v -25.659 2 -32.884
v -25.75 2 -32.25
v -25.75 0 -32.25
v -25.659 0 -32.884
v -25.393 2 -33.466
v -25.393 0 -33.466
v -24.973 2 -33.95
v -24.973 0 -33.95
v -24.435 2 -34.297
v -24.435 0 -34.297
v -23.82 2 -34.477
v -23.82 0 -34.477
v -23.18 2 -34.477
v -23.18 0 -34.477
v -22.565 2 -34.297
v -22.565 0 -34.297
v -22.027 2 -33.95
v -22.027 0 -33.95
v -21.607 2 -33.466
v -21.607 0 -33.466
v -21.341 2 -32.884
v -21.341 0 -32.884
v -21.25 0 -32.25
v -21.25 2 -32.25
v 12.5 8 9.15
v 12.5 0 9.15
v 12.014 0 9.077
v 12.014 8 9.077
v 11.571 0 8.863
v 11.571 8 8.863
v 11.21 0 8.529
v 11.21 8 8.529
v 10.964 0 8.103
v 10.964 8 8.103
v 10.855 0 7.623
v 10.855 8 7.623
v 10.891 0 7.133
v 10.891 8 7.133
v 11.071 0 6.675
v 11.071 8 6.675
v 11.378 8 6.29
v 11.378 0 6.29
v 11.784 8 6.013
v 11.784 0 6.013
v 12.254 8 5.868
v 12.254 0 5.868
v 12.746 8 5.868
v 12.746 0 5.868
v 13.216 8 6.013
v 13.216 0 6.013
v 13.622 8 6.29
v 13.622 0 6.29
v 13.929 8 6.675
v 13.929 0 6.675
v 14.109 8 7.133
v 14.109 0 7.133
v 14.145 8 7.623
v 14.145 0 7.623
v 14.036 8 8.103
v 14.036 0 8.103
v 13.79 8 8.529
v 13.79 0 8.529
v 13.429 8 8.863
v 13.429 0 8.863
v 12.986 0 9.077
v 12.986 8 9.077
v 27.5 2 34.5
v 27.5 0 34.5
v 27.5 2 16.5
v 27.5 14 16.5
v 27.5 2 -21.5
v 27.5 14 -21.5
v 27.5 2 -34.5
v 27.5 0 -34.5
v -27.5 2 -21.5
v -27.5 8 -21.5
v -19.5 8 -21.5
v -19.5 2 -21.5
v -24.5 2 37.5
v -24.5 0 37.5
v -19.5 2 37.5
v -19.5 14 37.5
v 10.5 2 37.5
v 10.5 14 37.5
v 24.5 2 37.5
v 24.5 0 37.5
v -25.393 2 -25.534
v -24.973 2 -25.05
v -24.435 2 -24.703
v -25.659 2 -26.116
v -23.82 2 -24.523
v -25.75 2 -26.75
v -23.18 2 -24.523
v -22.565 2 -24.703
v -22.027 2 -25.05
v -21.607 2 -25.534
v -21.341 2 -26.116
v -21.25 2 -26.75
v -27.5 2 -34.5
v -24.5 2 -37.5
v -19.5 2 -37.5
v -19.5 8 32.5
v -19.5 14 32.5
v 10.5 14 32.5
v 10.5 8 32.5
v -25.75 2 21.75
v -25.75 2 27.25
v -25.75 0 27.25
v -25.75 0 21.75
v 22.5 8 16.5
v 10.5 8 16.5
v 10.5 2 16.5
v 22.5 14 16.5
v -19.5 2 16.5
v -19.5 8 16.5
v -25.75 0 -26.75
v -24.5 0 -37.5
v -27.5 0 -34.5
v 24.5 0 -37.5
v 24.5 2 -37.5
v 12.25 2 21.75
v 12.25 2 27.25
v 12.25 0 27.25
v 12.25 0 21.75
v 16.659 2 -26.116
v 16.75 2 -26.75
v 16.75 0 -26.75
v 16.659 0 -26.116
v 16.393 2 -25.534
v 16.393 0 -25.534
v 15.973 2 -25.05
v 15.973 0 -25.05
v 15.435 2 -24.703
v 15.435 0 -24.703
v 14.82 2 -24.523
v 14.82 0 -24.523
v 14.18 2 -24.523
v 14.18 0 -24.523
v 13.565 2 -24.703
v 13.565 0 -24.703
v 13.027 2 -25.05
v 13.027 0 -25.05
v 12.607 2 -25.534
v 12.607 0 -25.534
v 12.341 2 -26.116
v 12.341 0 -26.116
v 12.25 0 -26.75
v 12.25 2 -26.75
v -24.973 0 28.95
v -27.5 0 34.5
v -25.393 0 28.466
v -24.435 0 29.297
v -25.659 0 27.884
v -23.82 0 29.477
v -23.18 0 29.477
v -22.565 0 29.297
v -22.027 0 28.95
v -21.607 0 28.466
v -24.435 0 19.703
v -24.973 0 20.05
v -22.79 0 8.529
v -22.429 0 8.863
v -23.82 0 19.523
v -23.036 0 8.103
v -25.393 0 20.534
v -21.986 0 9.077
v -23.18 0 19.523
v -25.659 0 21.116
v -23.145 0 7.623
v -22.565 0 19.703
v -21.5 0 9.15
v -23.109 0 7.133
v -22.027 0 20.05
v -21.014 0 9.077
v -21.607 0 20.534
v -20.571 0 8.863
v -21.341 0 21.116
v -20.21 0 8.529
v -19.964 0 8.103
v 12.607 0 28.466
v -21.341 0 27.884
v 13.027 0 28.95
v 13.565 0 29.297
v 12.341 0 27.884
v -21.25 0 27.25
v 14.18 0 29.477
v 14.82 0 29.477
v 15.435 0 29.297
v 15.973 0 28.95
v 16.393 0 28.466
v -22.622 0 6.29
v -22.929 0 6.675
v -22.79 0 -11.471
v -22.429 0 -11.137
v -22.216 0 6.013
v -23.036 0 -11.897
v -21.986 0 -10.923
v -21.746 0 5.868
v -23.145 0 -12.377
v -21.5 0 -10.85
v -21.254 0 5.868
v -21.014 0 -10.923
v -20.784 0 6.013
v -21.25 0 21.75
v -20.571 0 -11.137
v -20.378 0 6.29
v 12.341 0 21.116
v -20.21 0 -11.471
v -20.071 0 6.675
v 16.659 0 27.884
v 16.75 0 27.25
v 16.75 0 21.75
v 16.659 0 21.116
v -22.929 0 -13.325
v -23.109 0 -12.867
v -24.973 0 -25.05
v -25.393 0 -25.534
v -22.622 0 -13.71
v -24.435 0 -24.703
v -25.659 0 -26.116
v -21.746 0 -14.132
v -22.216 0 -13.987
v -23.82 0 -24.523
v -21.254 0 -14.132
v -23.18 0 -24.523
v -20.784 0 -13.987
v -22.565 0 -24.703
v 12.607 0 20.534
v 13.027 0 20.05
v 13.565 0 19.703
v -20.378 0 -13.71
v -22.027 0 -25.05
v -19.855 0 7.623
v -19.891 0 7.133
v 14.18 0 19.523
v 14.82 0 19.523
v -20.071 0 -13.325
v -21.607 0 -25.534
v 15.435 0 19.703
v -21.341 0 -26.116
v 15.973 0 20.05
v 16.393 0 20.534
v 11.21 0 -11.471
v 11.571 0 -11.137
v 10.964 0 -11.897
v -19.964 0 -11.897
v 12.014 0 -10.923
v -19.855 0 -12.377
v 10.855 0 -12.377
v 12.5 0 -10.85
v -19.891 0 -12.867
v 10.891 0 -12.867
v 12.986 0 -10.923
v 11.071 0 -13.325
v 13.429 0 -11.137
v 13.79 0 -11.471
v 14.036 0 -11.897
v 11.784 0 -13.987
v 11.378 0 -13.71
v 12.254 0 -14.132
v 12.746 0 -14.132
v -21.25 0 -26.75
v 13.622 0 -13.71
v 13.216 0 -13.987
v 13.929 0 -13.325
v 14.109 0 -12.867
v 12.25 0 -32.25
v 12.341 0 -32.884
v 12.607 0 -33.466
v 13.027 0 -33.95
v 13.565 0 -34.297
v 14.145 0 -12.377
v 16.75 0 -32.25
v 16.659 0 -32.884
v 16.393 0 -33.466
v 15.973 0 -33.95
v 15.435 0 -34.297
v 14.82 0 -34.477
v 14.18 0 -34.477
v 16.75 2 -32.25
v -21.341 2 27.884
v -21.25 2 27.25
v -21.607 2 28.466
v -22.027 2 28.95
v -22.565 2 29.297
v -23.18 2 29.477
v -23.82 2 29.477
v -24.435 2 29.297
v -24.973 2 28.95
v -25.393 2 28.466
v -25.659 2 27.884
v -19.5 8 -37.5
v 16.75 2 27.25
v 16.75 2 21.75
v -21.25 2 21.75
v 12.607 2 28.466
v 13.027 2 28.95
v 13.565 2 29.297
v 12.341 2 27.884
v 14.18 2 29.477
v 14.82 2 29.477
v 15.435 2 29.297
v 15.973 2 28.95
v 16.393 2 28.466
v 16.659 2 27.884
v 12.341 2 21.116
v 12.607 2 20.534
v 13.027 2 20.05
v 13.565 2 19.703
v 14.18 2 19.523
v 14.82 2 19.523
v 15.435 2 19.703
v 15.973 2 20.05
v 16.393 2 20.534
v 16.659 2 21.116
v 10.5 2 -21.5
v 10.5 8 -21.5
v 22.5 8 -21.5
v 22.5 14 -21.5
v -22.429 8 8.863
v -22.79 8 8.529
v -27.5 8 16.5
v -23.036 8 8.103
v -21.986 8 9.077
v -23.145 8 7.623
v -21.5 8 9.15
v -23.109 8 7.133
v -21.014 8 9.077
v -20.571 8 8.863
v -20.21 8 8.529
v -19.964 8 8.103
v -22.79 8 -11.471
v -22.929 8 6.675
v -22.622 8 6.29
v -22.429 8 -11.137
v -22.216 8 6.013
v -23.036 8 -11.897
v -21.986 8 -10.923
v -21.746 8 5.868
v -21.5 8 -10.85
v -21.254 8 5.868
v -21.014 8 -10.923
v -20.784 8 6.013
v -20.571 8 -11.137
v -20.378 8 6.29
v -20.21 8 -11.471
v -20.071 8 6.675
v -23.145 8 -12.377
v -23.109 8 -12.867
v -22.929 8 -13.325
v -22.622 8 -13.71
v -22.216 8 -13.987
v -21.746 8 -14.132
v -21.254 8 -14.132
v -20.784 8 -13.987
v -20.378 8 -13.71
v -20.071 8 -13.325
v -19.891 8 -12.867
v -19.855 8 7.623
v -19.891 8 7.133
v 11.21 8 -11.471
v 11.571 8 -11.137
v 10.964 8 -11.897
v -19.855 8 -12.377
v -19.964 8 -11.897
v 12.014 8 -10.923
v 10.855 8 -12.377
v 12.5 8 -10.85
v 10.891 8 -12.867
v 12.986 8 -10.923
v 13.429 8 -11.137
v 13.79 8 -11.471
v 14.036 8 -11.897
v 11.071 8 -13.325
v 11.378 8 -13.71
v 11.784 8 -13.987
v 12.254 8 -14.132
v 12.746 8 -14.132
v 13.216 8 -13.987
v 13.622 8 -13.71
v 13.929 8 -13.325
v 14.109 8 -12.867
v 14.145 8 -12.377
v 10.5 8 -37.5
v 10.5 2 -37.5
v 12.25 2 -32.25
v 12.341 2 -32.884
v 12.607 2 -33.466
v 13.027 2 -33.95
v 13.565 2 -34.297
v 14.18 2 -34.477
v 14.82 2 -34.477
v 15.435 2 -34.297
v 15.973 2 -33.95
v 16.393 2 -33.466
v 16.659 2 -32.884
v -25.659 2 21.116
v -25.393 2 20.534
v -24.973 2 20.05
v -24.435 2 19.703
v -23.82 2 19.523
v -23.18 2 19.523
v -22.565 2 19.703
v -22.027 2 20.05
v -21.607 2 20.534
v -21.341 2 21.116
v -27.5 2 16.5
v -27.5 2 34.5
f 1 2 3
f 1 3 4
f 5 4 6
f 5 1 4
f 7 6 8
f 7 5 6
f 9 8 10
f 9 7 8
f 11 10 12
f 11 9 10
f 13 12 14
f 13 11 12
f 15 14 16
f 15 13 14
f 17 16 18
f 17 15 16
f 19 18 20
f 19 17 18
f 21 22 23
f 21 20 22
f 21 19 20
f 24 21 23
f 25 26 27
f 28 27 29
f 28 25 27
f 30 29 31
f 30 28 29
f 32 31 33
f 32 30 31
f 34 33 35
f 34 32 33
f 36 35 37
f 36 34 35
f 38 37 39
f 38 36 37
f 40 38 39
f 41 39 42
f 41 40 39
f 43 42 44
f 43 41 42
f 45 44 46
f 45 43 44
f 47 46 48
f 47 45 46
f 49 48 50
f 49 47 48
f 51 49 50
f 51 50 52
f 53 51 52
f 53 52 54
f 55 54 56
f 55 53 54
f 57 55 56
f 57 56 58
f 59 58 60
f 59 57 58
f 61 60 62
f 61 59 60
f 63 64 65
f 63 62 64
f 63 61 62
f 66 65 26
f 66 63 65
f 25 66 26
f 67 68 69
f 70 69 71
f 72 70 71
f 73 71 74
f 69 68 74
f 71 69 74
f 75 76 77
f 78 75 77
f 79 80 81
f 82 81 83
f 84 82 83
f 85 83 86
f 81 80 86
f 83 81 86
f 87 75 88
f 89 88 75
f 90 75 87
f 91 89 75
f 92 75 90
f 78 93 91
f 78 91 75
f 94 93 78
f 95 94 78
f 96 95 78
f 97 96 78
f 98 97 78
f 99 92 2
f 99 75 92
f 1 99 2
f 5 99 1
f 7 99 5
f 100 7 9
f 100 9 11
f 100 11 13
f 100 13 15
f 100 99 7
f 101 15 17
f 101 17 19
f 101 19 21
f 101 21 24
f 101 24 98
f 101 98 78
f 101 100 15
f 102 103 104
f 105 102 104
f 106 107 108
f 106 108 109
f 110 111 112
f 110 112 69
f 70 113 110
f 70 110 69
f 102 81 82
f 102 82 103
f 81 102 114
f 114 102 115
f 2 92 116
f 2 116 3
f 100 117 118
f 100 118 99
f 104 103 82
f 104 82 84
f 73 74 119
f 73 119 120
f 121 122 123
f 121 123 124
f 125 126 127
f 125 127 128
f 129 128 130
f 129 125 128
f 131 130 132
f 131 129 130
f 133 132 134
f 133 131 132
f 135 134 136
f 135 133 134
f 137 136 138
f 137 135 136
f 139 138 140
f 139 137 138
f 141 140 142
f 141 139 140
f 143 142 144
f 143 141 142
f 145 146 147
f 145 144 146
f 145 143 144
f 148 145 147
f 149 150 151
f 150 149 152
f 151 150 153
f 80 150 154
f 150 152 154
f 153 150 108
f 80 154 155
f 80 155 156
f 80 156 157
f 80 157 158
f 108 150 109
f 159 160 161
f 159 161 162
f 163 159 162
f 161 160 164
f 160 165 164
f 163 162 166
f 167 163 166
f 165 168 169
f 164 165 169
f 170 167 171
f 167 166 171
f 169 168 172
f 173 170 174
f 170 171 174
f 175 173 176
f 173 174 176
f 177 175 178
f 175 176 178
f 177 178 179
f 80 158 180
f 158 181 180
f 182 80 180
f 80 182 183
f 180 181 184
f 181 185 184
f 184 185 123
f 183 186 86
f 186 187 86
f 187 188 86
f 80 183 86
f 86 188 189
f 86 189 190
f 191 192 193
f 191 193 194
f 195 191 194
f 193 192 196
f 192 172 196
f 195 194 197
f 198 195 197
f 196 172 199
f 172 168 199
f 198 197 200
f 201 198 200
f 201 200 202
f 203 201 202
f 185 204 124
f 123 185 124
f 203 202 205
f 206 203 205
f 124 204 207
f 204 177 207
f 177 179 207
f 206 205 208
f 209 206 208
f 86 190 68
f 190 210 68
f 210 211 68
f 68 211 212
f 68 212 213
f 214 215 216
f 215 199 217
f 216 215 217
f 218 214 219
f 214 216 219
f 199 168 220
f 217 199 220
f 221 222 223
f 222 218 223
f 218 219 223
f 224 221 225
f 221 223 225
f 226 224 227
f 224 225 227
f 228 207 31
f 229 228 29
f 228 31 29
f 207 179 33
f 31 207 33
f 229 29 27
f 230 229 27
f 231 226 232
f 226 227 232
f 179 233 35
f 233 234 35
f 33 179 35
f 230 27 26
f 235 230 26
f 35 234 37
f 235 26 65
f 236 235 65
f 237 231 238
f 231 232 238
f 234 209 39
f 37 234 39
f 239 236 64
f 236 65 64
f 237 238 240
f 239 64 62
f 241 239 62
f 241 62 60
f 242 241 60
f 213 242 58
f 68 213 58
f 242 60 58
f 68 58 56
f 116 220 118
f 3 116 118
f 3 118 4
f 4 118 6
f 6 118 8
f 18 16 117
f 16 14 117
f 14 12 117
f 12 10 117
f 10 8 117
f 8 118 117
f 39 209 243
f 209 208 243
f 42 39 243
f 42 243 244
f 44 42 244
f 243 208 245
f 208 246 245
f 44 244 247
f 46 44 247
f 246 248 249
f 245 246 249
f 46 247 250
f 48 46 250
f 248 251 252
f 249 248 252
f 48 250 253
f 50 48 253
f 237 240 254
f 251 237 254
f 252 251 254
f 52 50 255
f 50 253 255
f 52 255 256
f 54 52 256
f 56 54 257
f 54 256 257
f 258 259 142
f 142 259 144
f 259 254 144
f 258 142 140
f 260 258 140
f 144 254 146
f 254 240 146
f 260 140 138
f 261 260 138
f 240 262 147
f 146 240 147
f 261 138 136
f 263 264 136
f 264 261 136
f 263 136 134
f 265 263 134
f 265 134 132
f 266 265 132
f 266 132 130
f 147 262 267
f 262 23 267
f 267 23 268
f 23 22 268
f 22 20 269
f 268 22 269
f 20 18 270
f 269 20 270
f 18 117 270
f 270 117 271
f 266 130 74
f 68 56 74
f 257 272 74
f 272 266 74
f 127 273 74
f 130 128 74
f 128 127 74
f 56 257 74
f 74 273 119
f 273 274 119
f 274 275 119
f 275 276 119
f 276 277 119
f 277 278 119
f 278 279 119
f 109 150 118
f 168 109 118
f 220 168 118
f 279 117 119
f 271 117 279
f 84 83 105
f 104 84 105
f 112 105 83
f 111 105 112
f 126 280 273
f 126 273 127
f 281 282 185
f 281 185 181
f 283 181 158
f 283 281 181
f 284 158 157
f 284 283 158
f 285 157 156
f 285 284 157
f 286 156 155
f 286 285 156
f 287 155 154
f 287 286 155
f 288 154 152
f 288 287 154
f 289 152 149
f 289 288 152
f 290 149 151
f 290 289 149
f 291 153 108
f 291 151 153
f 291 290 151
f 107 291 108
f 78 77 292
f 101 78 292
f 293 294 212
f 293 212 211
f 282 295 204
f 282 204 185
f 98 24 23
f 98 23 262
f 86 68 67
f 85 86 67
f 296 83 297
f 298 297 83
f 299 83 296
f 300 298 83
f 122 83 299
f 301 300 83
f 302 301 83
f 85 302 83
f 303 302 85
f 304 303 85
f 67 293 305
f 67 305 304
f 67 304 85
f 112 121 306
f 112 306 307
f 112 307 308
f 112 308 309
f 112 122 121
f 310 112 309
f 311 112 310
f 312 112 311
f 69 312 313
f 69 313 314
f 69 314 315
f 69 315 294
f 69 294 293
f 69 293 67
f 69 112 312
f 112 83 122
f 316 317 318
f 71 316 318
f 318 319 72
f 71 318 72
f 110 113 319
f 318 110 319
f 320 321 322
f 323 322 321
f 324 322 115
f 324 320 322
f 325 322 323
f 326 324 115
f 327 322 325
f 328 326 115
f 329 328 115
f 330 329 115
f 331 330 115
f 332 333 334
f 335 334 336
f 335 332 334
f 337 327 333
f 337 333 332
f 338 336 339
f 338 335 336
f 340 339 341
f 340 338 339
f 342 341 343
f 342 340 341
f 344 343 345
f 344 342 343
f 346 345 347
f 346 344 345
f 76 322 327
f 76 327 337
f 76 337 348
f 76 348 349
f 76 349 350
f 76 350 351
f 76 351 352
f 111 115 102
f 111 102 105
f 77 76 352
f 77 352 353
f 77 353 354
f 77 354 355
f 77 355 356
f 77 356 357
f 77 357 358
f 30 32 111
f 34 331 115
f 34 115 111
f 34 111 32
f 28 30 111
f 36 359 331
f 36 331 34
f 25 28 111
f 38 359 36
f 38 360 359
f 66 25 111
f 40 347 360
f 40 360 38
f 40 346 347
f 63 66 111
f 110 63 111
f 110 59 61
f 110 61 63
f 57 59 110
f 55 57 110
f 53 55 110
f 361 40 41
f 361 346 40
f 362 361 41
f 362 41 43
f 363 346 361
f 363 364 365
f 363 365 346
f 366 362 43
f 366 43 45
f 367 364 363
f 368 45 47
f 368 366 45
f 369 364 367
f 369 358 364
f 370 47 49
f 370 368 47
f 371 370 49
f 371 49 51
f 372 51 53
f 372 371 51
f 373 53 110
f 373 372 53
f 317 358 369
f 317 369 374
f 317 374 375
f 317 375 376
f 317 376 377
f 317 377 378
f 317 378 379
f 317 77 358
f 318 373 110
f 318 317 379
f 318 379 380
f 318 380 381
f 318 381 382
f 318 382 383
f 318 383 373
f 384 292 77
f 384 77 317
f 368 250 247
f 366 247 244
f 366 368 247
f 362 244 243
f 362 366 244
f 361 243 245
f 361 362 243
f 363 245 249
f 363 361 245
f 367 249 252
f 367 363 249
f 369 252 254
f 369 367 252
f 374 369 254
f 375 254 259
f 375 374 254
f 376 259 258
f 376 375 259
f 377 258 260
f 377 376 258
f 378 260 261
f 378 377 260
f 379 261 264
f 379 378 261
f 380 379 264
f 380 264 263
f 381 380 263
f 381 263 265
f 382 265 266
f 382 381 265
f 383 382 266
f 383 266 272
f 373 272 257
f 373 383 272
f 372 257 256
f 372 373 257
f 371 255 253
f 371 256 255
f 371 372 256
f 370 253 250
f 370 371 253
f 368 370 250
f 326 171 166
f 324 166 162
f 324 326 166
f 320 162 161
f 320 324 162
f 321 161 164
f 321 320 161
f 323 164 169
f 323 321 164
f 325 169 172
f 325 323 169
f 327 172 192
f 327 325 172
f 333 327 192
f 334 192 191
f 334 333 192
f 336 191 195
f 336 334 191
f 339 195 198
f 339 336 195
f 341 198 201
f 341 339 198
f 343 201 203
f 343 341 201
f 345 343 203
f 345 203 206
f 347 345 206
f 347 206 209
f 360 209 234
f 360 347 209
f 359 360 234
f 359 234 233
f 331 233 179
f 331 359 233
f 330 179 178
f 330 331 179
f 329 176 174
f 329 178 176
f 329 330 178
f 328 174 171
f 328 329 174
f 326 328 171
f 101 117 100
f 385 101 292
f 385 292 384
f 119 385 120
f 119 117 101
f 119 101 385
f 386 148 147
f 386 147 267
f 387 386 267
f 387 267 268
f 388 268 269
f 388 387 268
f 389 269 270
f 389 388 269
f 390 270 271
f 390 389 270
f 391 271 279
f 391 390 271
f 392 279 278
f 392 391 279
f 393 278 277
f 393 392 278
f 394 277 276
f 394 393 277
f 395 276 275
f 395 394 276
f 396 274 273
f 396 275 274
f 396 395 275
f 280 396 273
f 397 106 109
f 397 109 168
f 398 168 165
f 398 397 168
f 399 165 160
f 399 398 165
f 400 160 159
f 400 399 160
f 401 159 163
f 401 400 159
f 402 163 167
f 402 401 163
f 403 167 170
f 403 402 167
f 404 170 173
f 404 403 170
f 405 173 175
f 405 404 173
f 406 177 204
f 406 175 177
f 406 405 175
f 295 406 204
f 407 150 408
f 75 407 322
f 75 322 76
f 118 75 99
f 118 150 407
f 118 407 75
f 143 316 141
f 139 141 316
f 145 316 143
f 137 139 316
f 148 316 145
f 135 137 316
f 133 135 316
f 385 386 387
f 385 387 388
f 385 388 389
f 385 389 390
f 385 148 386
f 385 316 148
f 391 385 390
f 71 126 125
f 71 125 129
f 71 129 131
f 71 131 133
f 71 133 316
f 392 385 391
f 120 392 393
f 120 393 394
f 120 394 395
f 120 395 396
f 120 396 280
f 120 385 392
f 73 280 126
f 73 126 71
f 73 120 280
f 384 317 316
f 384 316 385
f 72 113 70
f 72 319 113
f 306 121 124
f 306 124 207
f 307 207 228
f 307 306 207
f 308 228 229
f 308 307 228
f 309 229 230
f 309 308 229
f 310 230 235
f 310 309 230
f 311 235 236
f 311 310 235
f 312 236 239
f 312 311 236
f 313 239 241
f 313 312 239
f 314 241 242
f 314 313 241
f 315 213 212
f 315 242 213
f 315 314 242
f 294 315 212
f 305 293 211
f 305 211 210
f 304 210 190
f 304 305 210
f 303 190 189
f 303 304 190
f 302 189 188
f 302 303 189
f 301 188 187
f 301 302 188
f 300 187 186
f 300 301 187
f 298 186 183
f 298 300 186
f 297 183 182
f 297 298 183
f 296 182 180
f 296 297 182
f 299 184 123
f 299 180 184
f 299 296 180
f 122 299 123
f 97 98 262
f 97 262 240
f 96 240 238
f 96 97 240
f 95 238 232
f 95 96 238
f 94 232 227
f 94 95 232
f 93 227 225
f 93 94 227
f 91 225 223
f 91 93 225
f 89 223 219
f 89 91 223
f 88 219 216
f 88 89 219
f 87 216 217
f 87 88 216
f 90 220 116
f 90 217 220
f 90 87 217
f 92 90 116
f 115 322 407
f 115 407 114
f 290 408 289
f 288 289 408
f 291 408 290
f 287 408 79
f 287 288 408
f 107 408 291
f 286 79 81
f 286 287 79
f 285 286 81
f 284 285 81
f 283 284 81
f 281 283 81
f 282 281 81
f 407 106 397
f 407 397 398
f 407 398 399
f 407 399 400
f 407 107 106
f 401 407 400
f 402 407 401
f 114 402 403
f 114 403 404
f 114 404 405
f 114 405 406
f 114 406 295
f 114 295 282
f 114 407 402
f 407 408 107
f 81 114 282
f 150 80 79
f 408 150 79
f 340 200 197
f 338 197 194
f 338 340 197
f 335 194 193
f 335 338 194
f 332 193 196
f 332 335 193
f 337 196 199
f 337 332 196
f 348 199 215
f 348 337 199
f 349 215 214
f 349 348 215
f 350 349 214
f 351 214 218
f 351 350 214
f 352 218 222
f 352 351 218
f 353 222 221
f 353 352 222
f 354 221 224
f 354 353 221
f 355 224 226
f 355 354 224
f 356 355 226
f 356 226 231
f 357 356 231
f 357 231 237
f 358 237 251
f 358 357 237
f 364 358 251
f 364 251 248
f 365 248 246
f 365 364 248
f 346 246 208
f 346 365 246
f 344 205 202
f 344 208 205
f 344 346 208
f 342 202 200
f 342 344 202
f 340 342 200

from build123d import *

# Parameters (mm, degrees)
SKETCH_1_W                  = 55
SKETCH_1_H                  = 75
EXTRUDE_1_DEPTH             = 14
SKETCH_2_W                  = 50
SKETCH_2_H                  = 70
CUT_EXTRUDE_1_DEPTH         = 6
SKETCH_3_W                  = 17
SKETCH_3_H                  = 21
SKETCH_3_H_2                = 16
SKETCH_3_W_2                = 8
CUT_EXTRUDE_2_DEPTH         = 12
CUT_EXTRUDE_3_REACH         = 50.026
PATTERN_LINEAR_1_COUNT      = 2
PATTERN_LINEAR_1_PITCH      = 34
PATTERN_LINEAR_1_COUNT_DIR2 = 2
PATTERN_LINEAR_1_PITCH_DIR2 = 20
CHAMFER_1_SIZE              = 3


with BuildPart() as part:
    # 草图1 → 凸台-拉伸1 (new body)
    with BuildSketch(Plane(origin=(0, 0, 0), x_dir=(1, 0, 0), z_dir=(0, 1, 0))):
        Rectangle(SKETCH_1_W, SKETCH_1_H)
    extrude(amount=EXTRUDE_1_DEPTH)

    # 草图2 → 切除-拉伸1 (cut)
    with BuildSketch(Plane(origin=(0, 14, 0), x_dir=(1, 0, 0), z_dir=(0, 1, 0))):
        with Locations((-2.5, 2.5)):
            Rectangle(SKETCH_2_W, SKETCH_2_H)
    extrude(amount=-CUT_EXTRUDE_1_DEPTH, mode=Mode.SUBTRACT)

    # 草图3 → 切除-拉伸2 (cut)
    with BuildSketch(Plane(origin=(0, 14, 0), x_dir=(1, 0, 0), z_dir=(0, 1, 0))):
        with Locations((19, -27)):
            Rectangle(SKETCH_3_W, SKETCH_3_H)
        with Locations((19, 29.5)):
            Rectangle(SKETCH_3_W, SKETCH_3_H_2)
        with Locations((-23.5, 29.5)):
            Rectangle(SKETCH_3_W_2, SKETCH_3_H_2)
        with Locations((-23.5, -27)):
            Rectangle(SKETCH_3_W_2, SKETCH_3_H)
    extrude(amount=-CUT_EXTRUDE_2_DEPTH, mode=Mode.SUBTRACT)

    # 草图4 → 切除-拉伸3 (cut, up to next)
    with BuildSketch(Plane(origin=(0, 2, 0), x_dir=(1, 0, 0), z_dir=(0, 1, 0)), mode=Mode.PRIVATE) as cut_extrude_3_sk1:
        with BuildLine():
            Line((-21.25, 32.25), (-21.25, 26.75))
            ThreePointArc((-21.25, 26.75), (-23.5, 24.5), (-25.75, 26.75))
            Line((-25.75, 26.75), (-25.75, 32.25))
            ThreePointArc((-25.75, 32.25), (-23.5, 34.5), (-21.25, 32.25))
        make_face()
    cut_extrude_3_tool1 = extrude(cut_extrude_3_sk1.sketch, amount=-CUT_EXTRUDE_3_REACH, mode=Mode.PRIVATE) & part.part
    # 草图4 → 切除-拉伸3 (cut, up to next)
    with BuildSketch(Plane(origin=(0, 2, 0), x_dir=(1, 0, 0), z_dir=(0, 1, 0)), mode=Mode.PRIVATE) as cut_extrude_3_sk2:
        with BuildLine():
            Line((16.75, 32.25), (16.75, 26.75))
            ThreePointArc((16.75, 26.75), (14.5, 24.5), (12.25, 26.75))
            Line((12.25, 26.75), (12.25, 32.25))
            ThreePointArc((12.25, 32.25), (14.5, 34.5), (16.75, 32.25))
        make_face()
    cut_extrude_3_tool2 = extrude(cut_extrude_3_sk2.sketch, amount=-CUT_EXTRUDE_3_REACH, mode=Mode.PRIVATE) & part.part
    # 草图4 → 切除-拉伸3 (cut, up to next)
    with BuildSketch(Plane(origin=(0, 2, 0), x_dir=(1, 0, 0), z_dir=(0, 1, 0)), mode=Mode.PRIVATE) as cut_extrude_3_sk3:
        with BuildLine():
            Line((16.75, -21.75), (16.75, -27.25))
            ThreePointArc((16.75, -27.25), (14.5, -29.5), (12.25, -27.25))
            Line((12.25, -27.25), (12.25, -21.75))
            ThreePointArc((12.25, -21.75), (14.5, -19.5), (16.75, -21.75))
        make_face()
    cut_extrude_3_tool3 = extrude(cut_extrude_3_sk3.sketch, amount=-CUT_EXTRUDE_3_REACH, mode=Mode.PRIVATE) & part.part
    # 草图4 → 切除-拉伸3 (cut, up to next)
    with BuildSketch(Plane(origin=(0, 2, 0), x_dir=(1, 0, 0), z_dir=(0, 1, 0)), mode=Mode.PRIVATE) as cut_extrude_3_sk4:
        with BuildLine():
            Line((-21.25, -21.75), (-21.25, -27.25))
            ThreePointArc((-21.25, -27.25), (-23.5, -29.5), (-25.75, -27.25))
            Line((-25.75, -27.25), (-25.75, -21.75))
            ThreePointArc((-25.75, -21.75), (-23.5, -19.5), (-21.25, -21.75))
        make_face()
    cut_extrude_3_tool4 = extrude(cut_extrude_3_sk4.sketch, amount=-CUT_EXTRUDE_3_REACH, mode=Mode.PRIVATE) & part.part
    add(cut_extrude_3_tool1.solids().sort_by_distance((-23.5, 2, -29.5))[0], mode=Mode.SUBTRACT)
    add(cut_extrude_3_tool2.solids().sort_by_distance((14.5, 2, -29.5))[0], mode=Mode.SUBTRACT)
    add(cut_extrude_3_tool3.solids().sort_by_distance((14.5, 2, 24.5))[0], mode=Mode.SUBTRACT)
    add(cut_extrude_3_tool4.solids().sort_by_distance((-23.5, 2, 24.5))[0], mode=Mode.SUBTRACT)

    # 草图7 → M4 螺纹孔1 (revolve, cut)
    with BuildSketch(Plane(origin=(-21.5, 8, -12.5), x_dir=(0, 0, 1), z_dir=(1, 0, 0))):
        Polygon((0, 0), (0, 11.091420021), (1.65, 10.1), (1.65, 0), align=None)
    hole_wizard_m4_1 = revolve(axis=Axis((-21.5, 14.35, -12.5), (0, -1, 0)), mode=Mode.SUBTRACT)

    # 阵列(线性)1: Hole Wizard M4 _1 2 × 2
    with Locations(*[(i * PATTERN_LINEAR_1_PITCH, 0, j * PATTERN_LINEAR_1_PITCH_DIR2) for i in range(PATTERN_LINEAR_1_COUNT) for j in range(PATTERN_LINEAR_1_COUNT_DIR2) if (i, j) != (0, 0)]):
        add(hole_wizard_m4_1, mode=Mode.SUBTRACT)

    # 倒角1
    chamfer_1_edges = [part.edges().sort_by_distance(p)[0] for p in [
        (27.5, 1, -37.5),
        (-27.5, 1, -37.5),
        (27.5, 1, 37.5),
        (-27.5, 1, 37.5),
    ]]
    chamfer(chamfer_1_edges, length=CHAMFER_1_SIZE)


solid = part.part
